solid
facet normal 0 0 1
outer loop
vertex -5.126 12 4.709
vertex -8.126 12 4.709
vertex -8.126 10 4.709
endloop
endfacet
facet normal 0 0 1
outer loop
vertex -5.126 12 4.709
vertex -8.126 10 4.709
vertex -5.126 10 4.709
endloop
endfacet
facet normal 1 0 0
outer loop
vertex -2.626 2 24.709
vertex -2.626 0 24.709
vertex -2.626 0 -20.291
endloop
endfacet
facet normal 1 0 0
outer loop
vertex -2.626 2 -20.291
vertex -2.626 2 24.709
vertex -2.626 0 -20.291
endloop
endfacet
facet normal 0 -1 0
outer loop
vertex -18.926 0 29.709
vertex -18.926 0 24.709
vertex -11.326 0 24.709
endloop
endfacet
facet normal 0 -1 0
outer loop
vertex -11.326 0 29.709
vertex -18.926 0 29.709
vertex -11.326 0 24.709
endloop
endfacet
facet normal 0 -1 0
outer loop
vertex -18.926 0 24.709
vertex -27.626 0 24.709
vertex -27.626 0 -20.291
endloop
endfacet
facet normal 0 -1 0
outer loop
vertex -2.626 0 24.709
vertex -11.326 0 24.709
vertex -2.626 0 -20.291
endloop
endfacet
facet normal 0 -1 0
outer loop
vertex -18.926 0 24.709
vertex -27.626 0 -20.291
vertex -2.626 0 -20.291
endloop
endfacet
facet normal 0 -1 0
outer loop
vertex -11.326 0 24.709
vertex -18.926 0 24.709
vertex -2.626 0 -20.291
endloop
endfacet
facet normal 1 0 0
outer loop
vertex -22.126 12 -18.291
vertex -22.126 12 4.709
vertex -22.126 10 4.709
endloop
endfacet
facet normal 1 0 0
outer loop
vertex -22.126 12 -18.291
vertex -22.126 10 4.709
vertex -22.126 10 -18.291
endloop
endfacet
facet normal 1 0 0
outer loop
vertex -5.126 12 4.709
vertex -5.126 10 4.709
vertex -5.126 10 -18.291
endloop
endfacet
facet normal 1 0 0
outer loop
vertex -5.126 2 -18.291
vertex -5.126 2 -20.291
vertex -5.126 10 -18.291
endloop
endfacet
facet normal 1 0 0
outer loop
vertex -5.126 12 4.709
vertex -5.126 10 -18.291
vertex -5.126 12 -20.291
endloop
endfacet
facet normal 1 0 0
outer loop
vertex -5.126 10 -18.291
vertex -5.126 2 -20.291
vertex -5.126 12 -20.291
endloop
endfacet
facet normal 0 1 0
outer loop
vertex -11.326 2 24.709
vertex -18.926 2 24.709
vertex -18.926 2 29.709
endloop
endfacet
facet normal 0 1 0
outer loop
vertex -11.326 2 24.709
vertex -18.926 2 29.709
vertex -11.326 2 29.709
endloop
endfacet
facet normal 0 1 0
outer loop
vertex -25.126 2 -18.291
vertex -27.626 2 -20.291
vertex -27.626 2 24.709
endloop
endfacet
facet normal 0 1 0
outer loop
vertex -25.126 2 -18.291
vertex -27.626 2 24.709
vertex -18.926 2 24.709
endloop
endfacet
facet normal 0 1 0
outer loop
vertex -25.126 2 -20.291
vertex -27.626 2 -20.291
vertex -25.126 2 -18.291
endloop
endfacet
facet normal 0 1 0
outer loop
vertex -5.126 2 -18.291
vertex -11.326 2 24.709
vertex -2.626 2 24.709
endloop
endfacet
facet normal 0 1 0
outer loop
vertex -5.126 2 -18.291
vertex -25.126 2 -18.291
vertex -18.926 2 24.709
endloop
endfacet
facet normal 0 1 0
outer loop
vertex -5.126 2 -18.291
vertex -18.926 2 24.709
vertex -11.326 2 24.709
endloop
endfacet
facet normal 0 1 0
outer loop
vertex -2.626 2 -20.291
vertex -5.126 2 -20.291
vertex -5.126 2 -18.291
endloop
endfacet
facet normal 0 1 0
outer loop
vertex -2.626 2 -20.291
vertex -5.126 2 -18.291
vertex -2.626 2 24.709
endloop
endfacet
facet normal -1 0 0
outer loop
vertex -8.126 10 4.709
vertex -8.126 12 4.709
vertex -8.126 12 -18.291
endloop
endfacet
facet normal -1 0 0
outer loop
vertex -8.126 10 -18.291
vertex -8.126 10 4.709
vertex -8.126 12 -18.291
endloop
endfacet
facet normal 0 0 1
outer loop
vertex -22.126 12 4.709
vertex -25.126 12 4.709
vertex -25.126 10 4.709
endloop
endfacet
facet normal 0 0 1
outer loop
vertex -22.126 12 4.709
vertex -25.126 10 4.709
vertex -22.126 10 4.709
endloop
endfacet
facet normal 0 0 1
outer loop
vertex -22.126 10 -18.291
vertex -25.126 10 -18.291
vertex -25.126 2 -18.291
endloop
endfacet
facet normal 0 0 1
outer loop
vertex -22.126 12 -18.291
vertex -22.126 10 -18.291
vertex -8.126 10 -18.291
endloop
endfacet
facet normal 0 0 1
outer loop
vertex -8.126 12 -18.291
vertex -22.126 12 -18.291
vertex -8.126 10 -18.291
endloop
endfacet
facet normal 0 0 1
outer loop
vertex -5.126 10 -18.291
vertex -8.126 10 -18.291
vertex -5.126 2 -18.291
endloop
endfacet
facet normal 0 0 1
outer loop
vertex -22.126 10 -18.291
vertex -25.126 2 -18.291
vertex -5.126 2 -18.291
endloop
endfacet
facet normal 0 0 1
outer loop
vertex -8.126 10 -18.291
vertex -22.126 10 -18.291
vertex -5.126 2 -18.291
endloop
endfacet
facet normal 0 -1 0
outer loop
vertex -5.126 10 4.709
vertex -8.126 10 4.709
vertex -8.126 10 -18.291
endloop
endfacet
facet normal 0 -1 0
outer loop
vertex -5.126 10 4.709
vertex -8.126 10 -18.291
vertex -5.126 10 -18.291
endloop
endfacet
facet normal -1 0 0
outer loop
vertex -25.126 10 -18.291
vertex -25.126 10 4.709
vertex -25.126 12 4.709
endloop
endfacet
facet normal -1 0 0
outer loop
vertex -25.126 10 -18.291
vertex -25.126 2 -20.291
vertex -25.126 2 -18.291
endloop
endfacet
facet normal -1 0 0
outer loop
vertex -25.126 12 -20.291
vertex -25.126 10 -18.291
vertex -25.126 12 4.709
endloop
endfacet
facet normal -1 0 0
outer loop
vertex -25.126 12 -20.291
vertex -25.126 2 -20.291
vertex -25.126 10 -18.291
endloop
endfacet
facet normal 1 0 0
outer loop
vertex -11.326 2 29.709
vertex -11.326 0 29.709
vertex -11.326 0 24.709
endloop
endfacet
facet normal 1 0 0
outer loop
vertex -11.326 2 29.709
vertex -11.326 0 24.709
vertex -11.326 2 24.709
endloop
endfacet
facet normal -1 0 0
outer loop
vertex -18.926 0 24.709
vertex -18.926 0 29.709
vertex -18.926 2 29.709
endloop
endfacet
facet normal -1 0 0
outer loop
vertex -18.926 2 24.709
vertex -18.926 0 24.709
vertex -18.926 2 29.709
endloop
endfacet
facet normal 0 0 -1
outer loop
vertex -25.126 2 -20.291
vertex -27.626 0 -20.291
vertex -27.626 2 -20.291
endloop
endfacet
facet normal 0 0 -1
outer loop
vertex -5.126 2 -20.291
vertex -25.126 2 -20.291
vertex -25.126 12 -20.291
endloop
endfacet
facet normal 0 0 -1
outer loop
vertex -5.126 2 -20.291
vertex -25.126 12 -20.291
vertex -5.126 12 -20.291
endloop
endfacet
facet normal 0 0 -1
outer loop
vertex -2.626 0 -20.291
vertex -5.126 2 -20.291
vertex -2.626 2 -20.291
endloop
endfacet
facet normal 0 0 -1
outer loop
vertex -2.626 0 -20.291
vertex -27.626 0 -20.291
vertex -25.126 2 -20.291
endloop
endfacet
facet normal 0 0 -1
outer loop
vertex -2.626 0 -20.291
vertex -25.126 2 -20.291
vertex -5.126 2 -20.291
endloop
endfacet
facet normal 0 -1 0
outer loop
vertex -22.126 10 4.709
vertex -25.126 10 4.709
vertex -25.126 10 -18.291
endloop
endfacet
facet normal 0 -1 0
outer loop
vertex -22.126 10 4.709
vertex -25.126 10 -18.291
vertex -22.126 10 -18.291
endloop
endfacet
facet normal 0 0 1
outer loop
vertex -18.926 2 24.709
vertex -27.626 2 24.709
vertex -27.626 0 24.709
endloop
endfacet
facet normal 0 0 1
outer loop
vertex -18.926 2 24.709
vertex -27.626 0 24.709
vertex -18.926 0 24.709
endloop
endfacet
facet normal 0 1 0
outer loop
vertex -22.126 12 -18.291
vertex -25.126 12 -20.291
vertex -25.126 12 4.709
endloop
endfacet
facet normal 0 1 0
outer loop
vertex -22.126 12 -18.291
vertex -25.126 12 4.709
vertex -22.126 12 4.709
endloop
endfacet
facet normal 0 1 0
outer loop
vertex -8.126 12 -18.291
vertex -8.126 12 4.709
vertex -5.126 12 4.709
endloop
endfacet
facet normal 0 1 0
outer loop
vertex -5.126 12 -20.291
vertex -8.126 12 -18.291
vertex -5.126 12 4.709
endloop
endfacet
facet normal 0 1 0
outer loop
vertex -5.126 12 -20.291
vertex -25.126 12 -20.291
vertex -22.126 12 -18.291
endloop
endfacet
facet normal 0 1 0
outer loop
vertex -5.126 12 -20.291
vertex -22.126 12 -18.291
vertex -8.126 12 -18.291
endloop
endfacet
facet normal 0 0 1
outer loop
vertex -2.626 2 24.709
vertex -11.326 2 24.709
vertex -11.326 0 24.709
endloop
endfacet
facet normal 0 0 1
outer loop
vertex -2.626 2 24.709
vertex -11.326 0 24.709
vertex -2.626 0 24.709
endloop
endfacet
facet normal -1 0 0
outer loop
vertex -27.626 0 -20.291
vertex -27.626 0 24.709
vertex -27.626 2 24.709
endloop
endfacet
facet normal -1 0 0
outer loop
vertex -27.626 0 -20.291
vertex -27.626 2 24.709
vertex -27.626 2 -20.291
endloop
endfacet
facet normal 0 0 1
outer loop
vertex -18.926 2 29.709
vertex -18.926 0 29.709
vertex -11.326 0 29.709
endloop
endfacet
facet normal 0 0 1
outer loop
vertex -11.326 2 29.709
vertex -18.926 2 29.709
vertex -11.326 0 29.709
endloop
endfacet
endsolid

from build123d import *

# Parameters (mm, degrees)
SKETCH_1_W          = 25
SKETCH_1_H          = 50
EXTRUDE_1_DEPTH     = 2
SKETCH_3_W          = 20
SKETCH_3_H          = 2
EXTRUDE_2_DEPTH     = 10
SKETCH_4_W          = 20
SKETCH_4_H          = 2
EXTRUDE_3_DEPTH     = 23
SKETCH_5_W          = 14
SKETCH_5_H          = 23
CUT_EXTRUDE_1_DEPTH = 3
SKETCH_6_W          = 8.7
SKETCH_6_H          = 2
CUT_EXTRUDE_2_DEPTH = 5


with BuildPart() as part:
    # 草图1 → 凸台-拉伸1 (new body)
    with BuildSketch(Plane(origin=(0, 0, 0), x_dir=(1, 0, 0), z_dir=(0, 1, 0))):
        with Locations((-15.126272577, -4.709205827)):
            Rectangle(SKETCH_1_W, SKETCH_1_H)
    extrude(amount=EXTRUDE_1_DEPTH)

    # 草图3 → 凸台-拉伸2 (add)
    with BuildSketch(Plane(origin=(0, 2, 0), x_dir=(1, 0, 0), z_dir=(0, 1, 0))):
        with Locations((-15.126272577, 19.290794173)):
            Rectangle(SKETCH_3_W, SKETCH_3_H)
    extrude(amount=EXTRUDE_2_DEPTH)

    # 草图4 → 凸台-拉伸3 (add)
    with BuildSketch(Plane.XY.offset(-18.290794173)):
        with Locations((-15.126272577, 11)):
            Rectangle(SKETCH_4_W, SKETCH_4_H)
    extrude(amount=EXTRUDE_3_DEPTH)

    # 草图5 → 切除-拉伸1 (cut)
    with BuildSketch(Plane(origin=(0, 12, 0), x_dir=(1, 0, 0), z_dir=(0, 1, 0))):
        with Locations((-15.126272577, 6.790794173)):
            Rectangle(SKETCH_5_W, SKETCH_5_H)
    extrude(amount=-CUT_EXTRUDE_1_DEPTH, mode=Mode.SUBTRACT)

    # 草图6 → 切除-拉伸2 (cut)
    with BuildSketch(Plane.XY.offset(29.709205827)):
        with Locations((-6.976272577, 1)):
            Rectangle(SKETCH_6_W, SKETCH_6_H)
        with Locations((-23.276272577, 1)):
            Rectangle(SKETCH_6_W, SKETCH_6_H)
    extrude(amount=-CUT_EXTRUDE_2_DEPTH, mode=Mode.SUBTRACT)


solid = part.part
